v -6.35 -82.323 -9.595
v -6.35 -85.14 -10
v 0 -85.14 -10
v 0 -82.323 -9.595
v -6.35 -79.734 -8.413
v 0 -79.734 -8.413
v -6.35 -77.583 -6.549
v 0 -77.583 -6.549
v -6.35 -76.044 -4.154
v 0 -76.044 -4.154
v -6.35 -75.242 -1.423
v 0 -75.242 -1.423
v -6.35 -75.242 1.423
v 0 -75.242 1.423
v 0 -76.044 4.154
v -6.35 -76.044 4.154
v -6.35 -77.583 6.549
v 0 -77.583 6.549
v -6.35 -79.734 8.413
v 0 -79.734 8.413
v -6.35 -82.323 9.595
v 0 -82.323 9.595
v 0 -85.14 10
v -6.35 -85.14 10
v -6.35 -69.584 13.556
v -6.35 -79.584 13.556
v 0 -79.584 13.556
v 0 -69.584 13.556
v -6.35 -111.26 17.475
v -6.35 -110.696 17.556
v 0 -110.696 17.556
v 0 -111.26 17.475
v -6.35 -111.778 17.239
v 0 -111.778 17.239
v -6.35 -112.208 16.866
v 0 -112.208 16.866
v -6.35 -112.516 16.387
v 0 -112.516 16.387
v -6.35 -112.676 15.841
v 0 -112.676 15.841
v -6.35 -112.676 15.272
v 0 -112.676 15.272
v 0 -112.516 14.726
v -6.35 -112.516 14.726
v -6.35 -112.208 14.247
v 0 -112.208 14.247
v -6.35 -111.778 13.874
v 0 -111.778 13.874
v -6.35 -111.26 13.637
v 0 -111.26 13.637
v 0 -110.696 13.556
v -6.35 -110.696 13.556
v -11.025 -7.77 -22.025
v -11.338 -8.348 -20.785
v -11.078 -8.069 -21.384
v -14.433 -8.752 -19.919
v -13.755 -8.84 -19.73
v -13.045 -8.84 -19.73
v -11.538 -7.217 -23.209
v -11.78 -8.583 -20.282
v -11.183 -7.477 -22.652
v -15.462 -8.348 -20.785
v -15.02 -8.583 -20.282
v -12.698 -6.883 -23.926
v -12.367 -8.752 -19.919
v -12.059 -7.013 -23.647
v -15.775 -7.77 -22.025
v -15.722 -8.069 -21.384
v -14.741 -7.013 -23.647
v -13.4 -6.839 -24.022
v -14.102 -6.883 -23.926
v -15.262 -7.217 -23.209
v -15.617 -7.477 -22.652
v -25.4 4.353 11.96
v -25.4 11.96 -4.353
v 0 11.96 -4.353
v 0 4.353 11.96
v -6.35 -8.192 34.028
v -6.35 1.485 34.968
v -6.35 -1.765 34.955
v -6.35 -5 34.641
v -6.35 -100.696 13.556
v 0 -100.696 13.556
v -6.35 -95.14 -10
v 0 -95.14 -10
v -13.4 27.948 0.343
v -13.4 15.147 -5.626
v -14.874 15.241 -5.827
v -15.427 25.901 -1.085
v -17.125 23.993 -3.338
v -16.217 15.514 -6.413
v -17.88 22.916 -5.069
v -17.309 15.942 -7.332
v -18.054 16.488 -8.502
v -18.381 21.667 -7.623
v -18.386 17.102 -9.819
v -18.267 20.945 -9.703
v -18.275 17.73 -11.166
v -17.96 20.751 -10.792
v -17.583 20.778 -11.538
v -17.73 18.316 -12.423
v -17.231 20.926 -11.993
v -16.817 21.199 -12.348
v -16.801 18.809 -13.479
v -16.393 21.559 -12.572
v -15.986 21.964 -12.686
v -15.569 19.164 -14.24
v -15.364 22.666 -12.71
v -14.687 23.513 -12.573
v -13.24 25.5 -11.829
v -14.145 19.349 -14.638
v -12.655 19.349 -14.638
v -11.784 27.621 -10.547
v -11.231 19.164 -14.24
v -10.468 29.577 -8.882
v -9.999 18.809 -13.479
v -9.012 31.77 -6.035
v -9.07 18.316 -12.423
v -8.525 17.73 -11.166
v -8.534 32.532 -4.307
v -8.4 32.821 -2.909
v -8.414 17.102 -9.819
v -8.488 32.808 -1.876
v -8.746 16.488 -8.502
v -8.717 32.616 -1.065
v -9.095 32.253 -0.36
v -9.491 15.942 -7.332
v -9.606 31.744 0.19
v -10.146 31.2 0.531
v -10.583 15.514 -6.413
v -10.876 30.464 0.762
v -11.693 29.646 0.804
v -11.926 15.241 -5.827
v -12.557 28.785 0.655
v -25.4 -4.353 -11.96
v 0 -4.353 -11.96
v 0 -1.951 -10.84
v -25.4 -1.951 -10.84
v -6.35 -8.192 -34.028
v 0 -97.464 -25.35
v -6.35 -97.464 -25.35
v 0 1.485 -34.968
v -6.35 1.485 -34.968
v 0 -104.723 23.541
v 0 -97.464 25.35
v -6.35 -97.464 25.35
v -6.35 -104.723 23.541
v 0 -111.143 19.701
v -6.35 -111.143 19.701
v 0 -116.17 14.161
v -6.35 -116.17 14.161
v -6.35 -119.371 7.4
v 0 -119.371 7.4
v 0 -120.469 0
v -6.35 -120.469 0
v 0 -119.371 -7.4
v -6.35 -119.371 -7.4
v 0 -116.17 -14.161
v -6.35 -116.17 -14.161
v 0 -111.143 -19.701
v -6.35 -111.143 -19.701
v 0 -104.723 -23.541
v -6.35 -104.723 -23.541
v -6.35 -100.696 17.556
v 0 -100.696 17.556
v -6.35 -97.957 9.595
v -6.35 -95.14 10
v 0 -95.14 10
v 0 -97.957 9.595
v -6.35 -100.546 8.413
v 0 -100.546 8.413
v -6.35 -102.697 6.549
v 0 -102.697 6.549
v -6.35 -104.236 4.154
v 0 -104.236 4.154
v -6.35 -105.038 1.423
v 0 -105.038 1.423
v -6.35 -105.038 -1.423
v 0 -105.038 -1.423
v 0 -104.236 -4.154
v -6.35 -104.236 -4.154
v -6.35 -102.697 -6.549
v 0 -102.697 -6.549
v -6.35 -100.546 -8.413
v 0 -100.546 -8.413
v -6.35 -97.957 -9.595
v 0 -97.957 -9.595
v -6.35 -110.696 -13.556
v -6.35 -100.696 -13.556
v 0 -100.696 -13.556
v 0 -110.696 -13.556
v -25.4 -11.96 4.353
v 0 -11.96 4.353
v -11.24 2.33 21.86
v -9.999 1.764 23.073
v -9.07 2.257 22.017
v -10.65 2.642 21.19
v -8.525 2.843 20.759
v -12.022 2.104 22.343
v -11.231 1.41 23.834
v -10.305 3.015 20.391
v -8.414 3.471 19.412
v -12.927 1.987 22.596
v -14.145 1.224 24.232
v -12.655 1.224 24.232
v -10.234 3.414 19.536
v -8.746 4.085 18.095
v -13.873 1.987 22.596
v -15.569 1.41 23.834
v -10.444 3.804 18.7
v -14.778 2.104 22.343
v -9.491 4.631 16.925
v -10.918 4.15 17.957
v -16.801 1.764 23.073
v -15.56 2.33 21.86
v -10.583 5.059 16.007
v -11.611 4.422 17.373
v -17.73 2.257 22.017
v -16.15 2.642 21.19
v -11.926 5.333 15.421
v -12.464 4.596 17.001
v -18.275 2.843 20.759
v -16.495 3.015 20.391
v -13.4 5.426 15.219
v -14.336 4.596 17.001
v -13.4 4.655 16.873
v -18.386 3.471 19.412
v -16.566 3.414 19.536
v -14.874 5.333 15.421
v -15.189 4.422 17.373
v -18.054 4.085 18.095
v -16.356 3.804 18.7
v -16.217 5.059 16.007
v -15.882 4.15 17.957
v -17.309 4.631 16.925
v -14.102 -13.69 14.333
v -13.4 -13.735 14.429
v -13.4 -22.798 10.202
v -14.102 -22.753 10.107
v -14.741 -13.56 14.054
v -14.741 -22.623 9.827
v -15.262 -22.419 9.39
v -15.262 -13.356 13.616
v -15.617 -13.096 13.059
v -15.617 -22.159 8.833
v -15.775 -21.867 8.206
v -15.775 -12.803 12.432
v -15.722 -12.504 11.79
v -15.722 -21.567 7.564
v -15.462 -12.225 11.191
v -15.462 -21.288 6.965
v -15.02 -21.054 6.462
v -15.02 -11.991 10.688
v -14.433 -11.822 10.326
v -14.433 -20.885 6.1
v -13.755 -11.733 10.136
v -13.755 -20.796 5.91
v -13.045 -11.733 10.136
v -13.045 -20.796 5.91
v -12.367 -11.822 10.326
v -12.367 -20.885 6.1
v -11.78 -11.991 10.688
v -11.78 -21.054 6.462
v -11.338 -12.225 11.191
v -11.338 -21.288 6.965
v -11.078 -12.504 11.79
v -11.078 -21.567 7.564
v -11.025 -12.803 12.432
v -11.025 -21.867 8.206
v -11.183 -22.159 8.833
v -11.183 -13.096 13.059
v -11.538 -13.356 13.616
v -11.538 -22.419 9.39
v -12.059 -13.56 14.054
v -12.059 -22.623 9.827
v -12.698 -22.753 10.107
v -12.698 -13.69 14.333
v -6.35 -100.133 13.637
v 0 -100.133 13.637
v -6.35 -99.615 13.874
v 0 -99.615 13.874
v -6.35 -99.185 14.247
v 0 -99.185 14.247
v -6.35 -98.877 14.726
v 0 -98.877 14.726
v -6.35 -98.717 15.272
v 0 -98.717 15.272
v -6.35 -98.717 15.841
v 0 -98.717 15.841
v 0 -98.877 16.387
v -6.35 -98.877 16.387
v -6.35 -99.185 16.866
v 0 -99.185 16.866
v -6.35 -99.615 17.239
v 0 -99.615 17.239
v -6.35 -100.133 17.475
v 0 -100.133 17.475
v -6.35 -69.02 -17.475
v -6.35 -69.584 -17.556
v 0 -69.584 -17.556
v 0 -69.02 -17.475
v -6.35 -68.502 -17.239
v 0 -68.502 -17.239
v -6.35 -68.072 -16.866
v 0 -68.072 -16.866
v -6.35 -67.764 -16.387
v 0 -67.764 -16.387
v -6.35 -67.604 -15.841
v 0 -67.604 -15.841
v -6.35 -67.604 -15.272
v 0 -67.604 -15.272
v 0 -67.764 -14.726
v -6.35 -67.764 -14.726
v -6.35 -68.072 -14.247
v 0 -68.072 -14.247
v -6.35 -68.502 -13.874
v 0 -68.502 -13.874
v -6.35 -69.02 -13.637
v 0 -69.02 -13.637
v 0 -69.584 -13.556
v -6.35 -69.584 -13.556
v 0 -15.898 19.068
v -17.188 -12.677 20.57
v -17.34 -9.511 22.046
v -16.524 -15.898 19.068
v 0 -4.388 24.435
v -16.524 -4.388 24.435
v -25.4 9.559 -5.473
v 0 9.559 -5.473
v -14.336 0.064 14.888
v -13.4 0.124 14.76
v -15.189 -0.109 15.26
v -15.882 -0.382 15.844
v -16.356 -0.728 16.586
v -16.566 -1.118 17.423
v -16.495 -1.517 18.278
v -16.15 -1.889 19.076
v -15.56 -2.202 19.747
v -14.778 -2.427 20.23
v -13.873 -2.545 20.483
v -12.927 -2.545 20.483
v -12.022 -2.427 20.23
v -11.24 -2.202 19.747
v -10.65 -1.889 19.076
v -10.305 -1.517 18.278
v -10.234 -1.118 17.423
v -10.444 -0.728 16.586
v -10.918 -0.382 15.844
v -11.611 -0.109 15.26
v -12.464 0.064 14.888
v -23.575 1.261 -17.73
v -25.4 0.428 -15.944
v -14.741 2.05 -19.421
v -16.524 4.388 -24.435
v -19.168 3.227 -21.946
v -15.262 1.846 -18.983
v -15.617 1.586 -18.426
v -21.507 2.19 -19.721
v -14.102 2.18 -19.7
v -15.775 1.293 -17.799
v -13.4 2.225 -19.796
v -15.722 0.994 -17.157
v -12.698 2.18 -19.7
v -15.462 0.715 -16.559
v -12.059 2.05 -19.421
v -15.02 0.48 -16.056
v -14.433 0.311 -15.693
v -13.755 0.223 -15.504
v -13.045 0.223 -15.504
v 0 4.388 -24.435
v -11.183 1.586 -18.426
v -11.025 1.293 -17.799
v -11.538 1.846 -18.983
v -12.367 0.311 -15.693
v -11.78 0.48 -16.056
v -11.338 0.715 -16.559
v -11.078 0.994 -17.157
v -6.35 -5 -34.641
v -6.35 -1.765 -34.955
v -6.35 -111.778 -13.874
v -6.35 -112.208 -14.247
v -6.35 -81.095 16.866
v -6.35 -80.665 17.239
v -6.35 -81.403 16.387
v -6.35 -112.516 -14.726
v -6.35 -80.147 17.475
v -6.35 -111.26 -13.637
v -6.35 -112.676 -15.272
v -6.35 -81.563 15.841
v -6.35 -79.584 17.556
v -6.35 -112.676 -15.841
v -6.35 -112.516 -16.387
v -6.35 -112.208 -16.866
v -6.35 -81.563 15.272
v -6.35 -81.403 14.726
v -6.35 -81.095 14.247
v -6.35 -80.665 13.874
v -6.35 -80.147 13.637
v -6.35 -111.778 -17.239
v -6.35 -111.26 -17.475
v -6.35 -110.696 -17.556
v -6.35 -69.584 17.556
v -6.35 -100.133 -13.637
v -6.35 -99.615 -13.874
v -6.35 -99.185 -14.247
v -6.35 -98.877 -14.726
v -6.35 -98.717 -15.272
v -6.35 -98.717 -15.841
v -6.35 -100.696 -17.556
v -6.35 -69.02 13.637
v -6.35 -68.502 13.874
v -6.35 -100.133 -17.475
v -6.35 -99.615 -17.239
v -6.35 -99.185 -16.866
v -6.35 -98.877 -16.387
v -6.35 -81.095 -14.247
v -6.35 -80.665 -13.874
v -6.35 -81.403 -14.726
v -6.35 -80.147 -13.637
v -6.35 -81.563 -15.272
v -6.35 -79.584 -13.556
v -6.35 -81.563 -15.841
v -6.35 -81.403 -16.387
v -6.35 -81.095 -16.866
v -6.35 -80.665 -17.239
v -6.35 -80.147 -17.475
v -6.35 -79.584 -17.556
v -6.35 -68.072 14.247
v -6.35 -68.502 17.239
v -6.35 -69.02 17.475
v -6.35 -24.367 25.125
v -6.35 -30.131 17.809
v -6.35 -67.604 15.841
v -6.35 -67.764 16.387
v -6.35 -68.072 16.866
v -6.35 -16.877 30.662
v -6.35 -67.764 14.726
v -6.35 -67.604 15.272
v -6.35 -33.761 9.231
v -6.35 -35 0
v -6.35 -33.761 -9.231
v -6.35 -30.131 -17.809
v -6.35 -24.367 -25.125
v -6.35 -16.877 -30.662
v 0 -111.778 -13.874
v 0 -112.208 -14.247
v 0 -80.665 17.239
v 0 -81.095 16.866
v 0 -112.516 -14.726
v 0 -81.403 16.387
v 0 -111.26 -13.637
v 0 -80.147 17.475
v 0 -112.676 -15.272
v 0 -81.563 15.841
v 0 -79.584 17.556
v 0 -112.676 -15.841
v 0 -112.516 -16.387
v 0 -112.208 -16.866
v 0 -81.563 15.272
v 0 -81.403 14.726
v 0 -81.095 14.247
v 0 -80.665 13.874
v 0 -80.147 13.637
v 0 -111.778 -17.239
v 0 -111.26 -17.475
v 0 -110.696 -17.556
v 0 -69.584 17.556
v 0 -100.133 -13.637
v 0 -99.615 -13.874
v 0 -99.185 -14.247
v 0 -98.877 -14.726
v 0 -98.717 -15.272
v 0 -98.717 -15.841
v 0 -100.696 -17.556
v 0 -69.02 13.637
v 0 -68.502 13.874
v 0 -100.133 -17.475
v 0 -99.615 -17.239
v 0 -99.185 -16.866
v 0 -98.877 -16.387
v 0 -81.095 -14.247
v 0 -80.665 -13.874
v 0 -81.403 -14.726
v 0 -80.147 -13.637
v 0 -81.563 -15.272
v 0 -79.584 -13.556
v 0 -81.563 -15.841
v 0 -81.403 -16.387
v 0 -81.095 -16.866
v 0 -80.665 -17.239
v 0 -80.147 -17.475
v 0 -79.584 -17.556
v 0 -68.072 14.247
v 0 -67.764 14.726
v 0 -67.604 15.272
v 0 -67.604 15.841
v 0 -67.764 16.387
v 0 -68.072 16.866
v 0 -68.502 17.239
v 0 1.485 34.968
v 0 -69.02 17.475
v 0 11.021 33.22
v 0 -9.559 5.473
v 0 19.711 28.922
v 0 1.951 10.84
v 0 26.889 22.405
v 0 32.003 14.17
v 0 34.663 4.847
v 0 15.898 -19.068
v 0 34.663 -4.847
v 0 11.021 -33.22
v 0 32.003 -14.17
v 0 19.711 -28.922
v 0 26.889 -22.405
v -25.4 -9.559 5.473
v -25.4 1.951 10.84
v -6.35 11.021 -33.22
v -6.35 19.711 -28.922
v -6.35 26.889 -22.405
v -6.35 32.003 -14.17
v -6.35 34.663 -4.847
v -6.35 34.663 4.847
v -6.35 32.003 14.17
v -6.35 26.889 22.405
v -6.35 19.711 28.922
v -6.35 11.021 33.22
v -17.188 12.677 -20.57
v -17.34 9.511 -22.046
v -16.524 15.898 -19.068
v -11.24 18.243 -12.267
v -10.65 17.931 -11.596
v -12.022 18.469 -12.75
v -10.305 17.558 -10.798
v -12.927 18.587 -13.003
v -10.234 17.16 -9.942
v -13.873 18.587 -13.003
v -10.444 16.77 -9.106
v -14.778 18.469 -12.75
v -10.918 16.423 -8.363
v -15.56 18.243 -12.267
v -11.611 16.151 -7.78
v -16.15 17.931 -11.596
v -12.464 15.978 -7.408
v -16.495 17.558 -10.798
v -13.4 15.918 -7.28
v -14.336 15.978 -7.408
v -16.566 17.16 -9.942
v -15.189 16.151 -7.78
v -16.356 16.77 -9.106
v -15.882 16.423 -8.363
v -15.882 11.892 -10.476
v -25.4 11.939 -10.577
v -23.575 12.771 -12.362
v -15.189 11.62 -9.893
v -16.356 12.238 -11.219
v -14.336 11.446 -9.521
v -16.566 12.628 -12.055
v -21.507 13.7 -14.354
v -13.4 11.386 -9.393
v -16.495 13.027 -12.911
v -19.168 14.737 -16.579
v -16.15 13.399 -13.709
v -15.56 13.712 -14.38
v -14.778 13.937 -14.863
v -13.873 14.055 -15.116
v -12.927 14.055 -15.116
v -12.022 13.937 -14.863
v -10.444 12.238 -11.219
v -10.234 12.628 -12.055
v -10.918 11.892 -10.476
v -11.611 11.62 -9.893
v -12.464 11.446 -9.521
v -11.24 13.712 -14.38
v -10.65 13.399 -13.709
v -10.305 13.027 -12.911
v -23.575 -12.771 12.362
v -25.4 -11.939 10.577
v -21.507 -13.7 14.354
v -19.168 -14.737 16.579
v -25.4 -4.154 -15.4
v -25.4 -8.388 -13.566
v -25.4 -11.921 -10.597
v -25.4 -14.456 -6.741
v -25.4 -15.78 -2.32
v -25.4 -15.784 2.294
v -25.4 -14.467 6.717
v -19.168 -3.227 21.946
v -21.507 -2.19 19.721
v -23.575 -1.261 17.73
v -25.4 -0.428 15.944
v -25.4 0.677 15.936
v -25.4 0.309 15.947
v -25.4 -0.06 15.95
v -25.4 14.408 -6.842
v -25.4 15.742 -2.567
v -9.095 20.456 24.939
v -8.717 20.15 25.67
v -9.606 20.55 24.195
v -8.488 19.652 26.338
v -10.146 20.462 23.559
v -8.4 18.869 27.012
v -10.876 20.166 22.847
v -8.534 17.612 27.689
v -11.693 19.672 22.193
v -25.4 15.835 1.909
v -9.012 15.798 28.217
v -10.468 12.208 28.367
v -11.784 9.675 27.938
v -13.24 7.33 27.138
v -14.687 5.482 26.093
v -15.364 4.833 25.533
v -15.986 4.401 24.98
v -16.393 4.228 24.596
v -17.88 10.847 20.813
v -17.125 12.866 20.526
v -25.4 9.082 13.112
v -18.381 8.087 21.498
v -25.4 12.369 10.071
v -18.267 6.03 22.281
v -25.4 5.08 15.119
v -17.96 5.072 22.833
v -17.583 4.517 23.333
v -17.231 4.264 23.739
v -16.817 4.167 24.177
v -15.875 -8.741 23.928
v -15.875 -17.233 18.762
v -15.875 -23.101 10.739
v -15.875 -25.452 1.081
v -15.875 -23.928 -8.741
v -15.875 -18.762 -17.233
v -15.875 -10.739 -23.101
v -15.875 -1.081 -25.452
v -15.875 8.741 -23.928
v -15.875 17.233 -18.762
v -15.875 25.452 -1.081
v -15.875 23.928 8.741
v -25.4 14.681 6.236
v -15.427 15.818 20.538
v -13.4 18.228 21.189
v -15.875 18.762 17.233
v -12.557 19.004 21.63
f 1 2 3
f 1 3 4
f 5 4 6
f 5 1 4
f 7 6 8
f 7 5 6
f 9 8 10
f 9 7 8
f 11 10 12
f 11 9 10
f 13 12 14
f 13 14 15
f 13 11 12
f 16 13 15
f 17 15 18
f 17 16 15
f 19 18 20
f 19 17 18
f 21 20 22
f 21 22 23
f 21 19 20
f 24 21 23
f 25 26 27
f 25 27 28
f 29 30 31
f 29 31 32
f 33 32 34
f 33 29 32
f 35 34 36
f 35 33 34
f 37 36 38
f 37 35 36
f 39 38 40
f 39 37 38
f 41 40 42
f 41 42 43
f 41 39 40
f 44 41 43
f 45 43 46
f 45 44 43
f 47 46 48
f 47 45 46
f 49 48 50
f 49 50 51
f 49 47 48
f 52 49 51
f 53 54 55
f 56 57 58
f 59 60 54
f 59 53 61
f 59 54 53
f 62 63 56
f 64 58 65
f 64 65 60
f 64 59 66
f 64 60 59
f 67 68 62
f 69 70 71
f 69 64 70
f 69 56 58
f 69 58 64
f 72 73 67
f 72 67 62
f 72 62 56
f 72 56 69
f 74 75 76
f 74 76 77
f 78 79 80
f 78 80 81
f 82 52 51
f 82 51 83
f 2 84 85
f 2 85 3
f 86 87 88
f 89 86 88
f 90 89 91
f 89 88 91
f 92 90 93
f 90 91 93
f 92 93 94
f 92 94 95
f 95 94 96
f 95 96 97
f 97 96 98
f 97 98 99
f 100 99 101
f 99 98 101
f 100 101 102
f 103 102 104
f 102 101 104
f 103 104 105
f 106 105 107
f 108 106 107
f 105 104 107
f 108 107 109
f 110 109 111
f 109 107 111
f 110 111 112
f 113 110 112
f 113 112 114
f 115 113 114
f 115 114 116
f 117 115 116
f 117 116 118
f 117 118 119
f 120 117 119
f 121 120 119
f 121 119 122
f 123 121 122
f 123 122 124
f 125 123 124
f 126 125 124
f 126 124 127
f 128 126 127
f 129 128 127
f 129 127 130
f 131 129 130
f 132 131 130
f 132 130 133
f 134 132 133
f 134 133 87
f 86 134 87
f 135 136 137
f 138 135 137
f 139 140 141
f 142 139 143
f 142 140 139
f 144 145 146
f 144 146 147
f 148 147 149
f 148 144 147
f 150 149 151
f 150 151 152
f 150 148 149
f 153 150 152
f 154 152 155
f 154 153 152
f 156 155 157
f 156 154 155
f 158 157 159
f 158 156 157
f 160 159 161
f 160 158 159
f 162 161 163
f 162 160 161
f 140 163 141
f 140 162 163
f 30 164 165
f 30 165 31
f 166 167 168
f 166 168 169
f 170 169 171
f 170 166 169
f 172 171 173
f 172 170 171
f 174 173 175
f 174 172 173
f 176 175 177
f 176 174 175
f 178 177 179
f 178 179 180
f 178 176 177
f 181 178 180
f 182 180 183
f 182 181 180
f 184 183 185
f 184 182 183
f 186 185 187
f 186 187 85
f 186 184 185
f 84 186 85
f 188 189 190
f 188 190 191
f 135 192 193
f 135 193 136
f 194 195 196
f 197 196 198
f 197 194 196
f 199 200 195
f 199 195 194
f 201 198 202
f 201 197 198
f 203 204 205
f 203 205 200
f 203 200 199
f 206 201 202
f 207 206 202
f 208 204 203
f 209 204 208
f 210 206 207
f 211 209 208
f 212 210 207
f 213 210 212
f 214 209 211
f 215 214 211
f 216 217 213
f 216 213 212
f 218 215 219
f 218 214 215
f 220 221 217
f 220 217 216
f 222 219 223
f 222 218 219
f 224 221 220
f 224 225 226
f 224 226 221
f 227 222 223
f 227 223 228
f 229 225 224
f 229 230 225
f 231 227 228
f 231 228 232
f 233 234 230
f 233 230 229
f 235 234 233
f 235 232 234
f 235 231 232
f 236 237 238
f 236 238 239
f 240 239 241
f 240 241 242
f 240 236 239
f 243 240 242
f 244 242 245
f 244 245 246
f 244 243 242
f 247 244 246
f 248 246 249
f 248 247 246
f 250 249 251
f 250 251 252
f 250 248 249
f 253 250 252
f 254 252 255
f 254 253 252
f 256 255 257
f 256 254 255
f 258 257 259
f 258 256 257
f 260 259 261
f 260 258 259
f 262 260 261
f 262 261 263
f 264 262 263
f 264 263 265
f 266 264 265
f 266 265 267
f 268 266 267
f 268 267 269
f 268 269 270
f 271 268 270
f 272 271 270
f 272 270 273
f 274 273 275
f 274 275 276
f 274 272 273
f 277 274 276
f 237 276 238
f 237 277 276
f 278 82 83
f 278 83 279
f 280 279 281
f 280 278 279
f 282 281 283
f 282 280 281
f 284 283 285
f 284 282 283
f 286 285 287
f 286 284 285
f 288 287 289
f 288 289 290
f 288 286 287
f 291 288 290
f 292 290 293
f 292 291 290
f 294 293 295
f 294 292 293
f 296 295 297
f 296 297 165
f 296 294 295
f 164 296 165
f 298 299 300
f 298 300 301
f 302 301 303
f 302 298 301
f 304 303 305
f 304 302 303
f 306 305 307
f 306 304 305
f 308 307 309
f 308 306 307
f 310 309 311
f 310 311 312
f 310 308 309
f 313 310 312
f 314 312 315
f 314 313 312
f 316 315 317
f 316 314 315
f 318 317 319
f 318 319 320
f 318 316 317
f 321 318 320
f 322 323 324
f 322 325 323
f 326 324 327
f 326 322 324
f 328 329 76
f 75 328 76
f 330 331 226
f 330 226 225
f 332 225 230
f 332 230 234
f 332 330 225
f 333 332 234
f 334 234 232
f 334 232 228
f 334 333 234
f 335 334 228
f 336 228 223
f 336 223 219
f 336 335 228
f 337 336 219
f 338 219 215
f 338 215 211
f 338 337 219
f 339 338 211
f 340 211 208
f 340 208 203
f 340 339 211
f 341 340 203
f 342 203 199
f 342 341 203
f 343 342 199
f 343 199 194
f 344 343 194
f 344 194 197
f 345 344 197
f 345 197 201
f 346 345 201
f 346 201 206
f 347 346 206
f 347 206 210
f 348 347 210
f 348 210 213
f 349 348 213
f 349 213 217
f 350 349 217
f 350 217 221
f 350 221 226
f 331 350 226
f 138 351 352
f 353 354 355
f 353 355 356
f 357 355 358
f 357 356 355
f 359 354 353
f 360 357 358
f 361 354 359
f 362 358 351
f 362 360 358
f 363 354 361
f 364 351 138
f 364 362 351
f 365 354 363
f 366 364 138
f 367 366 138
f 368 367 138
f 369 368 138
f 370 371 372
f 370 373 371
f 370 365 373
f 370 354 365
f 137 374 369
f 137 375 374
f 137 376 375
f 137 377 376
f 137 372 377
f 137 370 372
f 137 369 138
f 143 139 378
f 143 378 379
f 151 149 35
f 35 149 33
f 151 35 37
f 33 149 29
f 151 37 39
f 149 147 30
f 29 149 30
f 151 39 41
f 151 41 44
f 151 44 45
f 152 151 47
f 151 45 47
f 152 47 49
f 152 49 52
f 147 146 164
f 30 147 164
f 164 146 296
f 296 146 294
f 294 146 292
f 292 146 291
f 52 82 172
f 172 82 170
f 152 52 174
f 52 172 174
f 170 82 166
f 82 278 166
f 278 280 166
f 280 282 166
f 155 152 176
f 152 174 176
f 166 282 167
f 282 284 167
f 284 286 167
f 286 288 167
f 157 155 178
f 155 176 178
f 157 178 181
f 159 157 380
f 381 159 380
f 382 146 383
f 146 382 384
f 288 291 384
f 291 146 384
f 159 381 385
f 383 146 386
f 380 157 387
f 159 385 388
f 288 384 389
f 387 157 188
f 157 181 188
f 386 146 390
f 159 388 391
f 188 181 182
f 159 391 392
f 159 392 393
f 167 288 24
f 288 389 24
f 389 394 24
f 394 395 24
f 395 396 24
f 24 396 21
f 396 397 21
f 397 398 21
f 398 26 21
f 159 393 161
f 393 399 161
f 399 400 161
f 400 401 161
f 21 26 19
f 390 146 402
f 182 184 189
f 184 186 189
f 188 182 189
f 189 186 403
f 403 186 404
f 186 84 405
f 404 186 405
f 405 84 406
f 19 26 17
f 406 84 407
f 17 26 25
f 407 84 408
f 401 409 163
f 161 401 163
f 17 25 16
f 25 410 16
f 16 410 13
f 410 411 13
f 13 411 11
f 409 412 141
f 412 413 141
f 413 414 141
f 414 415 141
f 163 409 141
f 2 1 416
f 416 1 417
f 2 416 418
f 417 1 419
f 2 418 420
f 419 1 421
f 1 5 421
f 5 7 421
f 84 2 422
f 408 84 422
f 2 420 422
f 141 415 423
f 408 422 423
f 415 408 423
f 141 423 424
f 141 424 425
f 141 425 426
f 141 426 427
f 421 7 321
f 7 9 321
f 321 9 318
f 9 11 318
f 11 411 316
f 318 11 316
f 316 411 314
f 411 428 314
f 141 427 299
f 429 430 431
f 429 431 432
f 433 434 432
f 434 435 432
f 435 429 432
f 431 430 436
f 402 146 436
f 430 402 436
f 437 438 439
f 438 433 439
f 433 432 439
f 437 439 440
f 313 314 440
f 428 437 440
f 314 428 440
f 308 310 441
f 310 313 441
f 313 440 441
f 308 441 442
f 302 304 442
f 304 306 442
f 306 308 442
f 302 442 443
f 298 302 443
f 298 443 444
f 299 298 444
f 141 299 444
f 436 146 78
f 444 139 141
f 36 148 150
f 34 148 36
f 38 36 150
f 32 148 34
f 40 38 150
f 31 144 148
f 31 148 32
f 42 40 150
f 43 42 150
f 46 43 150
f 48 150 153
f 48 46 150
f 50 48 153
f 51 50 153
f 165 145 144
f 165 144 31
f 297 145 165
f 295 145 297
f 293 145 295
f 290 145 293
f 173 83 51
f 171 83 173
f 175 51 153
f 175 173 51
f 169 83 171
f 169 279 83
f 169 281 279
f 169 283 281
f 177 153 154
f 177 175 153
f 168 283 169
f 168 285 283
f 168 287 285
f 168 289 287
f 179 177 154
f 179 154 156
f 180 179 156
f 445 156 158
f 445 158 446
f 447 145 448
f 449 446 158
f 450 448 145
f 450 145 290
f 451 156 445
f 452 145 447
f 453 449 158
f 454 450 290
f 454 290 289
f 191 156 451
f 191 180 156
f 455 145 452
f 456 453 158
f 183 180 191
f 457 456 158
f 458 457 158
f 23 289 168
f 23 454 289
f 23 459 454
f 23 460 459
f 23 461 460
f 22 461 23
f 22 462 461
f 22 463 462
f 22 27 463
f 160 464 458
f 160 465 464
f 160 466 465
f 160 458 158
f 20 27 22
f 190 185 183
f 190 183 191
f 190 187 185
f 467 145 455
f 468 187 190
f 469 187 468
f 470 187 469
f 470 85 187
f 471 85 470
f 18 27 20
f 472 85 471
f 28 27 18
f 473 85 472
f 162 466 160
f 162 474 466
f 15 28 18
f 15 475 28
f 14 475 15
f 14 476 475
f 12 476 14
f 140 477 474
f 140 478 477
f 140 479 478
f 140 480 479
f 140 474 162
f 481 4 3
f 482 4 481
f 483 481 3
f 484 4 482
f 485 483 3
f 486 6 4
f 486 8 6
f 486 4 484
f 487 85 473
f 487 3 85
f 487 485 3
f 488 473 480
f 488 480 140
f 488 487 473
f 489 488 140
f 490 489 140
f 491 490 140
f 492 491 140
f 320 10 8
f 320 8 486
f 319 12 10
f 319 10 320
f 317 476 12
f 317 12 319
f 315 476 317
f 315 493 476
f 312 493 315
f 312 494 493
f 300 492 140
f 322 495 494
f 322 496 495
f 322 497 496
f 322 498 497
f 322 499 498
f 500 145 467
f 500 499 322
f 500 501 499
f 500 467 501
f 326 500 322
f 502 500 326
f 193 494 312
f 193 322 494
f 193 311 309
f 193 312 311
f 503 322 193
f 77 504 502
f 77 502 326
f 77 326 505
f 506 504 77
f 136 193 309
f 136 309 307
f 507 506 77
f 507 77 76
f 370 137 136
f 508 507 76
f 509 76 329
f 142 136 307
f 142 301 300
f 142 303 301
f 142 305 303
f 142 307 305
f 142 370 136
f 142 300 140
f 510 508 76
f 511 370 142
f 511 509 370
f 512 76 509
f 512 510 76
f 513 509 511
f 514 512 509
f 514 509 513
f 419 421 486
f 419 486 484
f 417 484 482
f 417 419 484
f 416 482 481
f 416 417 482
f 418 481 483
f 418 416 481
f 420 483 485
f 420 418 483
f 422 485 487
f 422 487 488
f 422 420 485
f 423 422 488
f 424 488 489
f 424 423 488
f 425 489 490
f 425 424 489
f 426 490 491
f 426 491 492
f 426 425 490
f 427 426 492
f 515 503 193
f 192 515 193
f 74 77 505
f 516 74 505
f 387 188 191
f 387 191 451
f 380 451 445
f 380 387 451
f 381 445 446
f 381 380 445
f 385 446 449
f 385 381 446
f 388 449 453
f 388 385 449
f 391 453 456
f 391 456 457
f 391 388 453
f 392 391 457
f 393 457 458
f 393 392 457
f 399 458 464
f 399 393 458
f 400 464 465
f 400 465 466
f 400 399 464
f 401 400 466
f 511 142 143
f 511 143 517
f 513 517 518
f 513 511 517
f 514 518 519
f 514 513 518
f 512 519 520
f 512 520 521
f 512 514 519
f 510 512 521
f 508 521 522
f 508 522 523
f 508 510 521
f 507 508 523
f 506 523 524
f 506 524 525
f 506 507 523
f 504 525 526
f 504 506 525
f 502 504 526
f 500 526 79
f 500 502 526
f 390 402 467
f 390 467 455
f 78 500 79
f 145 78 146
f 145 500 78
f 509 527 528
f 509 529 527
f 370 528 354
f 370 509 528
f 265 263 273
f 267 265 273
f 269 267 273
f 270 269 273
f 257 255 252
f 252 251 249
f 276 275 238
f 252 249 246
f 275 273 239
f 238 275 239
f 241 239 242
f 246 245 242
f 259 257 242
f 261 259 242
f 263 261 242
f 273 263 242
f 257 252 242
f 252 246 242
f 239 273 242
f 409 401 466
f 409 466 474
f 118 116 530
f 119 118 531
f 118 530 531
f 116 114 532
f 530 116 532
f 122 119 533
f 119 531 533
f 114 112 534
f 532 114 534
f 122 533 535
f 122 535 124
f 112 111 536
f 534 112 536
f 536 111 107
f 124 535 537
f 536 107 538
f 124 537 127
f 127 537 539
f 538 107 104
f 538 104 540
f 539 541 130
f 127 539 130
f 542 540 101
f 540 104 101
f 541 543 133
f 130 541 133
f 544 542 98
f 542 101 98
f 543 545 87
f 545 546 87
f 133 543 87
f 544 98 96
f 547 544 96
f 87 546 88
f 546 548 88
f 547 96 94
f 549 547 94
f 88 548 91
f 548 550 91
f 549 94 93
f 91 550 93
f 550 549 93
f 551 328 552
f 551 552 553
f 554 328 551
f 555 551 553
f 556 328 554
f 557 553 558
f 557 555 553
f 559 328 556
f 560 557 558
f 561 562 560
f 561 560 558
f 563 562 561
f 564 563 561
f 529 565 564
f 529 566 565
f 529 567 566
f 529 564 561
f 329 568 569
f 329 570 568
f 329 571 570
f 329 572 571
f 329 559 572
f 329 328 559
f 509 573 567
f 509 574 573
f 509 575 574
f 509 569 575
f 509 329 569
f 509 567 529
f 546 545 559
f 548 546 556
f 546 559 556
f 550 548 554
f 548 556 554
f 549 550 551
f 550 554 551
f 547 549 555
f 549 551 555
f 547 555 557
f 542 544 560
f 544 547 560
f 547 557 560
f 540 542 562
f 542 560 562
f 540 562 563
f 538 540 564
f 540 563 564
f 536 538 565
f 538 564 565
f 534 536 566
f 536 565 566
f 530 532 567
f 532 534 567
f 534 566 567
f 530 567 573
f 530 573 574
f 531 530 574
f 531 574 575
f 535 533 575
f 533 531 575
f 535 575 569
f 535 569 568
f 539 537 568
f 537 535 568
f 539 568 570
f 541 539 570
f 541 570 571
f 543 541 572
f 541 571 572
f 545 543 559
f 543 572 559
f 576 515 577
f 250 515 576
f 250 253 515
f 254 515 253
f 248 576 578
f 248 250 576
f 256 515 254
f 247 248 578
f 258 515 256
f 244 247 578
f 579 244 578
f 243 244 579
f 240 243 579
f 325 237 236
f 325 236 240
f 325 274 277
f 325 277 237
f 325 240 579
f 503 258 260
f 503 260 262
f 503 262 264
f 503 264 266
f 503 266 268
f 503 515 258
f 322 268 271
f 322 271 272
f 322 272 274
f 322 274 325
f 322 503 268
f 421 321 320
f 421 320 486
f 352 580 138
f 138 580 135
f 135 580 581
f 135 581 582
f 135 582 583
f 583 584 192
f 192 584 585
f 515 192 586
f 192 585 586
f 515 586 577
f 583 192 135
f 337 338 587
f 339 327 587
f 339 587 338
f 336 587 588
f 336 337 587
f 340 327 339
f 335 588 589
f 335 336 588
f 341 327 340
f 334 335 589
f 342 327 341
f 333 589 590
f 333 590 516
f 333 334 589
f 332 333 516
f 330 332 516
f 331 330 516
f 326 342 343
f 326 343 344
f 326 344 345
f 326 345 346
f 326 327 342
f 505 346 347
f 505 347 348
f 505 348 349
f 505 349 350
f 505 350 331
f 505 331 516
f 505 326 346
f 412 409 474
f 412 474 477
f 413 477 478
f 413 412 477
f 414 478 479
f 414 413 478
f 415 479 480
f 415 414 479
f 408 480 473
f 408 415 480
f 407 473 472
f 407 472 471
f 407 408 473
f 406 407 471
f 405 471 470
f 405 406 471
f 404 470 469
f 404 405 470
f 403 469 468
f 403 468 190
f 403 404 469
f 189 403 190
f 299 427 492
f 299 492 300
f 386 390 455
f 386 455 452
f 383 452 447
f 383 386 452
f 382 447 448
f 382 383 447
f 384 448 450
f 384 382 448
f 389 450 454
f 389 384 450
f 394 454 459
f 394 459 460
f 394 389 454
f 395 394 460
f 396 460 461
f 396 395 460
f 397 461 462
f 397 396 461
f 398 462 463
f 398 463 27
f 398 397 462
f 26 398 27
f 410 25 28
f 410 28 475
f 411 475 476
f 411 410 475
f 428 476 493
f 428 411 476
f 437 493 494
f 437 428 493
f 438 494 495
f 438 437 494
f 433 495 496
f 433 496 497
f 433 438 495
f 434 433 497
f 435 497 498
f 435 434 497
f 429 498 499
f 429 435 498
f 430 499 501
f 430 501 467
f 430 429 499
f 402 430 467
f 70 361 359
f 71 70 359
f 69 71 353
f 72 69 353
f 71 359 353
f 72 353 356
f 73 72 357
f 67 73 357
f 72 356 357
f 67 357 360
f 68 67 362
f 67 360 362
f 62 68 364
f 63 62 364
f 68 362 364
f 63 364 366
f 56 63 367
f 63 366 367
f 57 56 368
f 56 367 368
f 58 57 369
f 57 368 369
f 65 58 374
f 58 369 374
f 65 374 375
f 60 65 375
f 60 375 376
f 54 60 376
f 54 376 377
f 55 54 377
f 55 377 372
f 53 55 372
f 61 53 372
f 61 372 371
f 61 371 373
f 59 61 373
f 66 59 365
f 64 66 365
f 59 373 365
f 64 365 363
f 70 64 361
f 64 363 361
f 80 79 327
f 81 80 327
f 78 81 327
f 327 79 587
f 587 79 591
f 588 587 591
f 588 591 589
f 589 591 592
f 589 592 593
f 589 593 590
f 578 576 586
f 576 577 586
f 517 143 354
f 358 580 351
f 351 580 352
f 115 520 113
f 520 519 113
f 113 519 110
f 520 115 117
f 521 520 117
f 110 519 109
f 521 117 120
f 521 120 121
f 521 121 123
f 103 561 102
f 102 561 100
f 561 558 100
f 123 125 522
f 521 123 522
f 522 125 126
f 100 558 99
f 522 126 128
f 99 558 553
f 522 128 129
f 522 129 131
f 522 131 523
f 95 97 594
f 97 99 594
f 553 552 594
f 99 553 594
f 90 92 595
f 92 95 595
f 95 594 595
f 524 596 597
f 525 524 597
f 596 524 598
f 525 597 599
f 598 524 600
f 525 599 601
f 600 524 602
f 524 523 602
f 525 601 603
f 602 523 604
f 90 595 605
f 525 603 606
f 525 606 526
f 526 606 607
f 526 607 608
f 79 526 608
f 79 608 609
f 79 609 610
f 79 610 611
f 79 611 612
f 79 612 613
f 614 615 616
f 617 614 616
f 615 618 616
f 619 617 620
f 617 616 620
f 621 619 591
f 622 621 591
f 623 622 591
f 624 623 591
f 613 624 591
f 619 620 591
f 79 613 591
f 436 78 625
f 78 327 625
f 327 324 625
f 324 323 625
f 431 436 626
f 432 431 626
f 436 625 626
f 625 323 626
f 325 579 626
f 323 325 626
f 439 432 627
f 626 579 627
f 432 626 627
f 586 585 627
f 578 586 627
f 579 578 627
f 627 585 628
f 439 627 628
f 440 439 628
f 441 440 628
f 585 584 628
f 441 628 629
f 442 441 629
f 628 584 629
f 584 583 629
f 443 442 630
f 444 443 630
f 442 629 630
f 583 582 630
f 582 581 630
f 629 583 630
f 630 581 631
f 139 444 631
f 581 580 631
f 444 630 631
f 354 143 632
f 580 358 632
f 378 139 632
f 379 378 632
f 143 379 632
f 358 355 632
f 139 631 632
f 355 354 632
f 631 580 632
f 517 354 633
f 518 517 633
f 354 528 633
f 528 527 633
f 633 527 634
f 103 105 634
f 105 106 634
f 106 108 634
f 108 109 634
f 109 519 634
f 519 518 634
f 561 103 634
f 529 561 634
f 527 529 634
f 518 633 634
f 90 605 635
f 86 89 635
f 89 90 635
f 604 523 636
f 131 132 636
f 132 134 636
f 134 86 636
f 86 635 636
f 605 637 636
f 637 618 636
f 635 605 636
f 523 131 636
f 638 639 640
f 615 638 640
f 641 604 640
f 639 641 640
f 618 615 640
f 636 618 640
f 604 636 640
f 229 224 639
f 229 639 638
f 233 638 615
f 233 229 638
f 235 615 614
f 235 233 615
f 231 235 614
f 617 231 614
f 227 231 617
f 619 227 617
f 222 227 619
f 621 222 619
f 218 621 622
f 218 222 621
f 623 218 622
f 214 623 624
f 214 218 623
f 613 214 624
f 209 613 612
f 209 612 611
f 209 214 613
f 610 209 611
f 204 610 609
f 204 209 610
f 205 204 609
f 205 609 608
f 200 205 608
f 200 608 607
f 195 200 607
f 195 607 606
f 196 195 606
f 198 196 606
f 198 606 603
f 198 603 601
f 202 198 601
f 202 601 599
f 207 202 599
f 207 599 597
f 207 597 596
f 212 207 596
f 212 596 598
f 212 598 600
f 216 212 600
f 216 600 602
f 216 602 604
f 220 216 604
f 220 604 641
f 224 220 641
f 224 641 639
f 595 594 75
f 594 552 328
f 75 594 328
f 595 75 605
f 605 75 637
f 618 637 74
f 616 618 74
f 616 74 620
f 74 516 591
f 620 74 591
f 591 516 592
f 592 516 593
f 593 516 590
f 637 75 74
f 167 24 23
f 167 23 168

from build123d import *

# Parameters (mm, degrees)
BOSS_EXTRUDE1_DEPTH = 6.35
SKETCH20_R          = 35
BOSS_EXTRUDE5_DEPTH = 19.05
CUT_EXTRUDE14_DEPTH = 128.996314535
CHAMFER1_SIZE       = 19.05
SKETCH22_R          = 3.175
CUT_EXTRUDE15_DEPTH = 135.156064825
SKETCH24_R          = 5
CUT_EXTRUDE16_DEPTH = 140.018309755
SKETCH25_R          = 2.38125
CUT_EXTRUDE17_DEPTH = 10
CUT_EXTRUDE18_DEPTH = 10


with BuildPart() as part:
    # Sketch1 → Boss-Extrude1 (new body)
    with BuildSketch(Plane(origin=(0, 0, 0), x_dir=(0, 0, -1), z_dir=(1, 0, 0))):
        with BuildLine():
            Line((-34.968464441, 1.48542743), (-25.35, -97.464164516))
            ThreePointArc((-25.35, -97.464164516), (0, -120.469483831), (25.35, -97.464164516))
            Line((25.35, -97.464164516), (34.968464441, 1.48542743))
            ThreePointArc((34.968464441, 1.48542743), (0, 35), (-34.968464441, 1.48542743))
        make_face()
        Polygon((4.353205728, 11.960334439), (-11.960334439, 4.353205728), (-4.353205728, -11.960334439), (11.960334439, -4.353205728), align=None, mode=Mode.SUBTRACT)
    extrude(amount=BOSS_EXTRUDE1_DEPTH)

    # Sketch20 → Boss-Extrude5 (add)
    with BuildSketch(Plane(origin=(6.35, 0, 0), x_dir=(0, 0, -1), z_dir=(1, 0, 0))):
        with Locations(Location((0, 0, 0), (0, 0, 177.567591624))):
            Circle(SKETCH20_R)
    extrude(amount=BOSS_EXTRUDE5_DEPTH)

    # Sketch21 → Cut-Extrude14 (cut, through all)
    with BuildSketch(Plane.ZY):
        Polygon((-19.067760927, 15.897892729), (-24.435012851, 4.387783834), (-10.840396045, -1.951490092), (-5.473144121, 9.558618803), align=None)
        Polygon((-11.960334439, -4.353205728), (-4.353205728, 11.960334439), (11.960334439, 4.353205728), (4.353205728, -11.960334439), align=None)
        Polygon((10.840396045, 1.951490092), (5.473144121, -9.558618803), (19.067760927, -15.897892729), (24.435012851, -4.387783834), align=None)
    extrude(amount=-CUT_EXTRUDE14_DEPTH, mode=Mode.SUBTRACT)

    # Chamfer1
    # the kernel refuses this chamfer: 19.05 mm, written as the material it takes off along each edge
    with BuildSketch(Plane(origin=(25.4, 0, 0), x_dir=(0, 0.042440783710504346, 0.9990989840241247), z_dir=(0, 0.9990989840241247, -0.042440783710504346))) as chamfer1_piece_1:
        Polygon((35, -CHAMFER1_SIZE), (35 - CHAMFER1_SIZE, 0), (35, 0), align=None)
    revolve(axis=Axis((25.4, 0, 0), (1, 0, 0)), mode=Mode.SUBTRACT)

    # Sketch22 → Cut-Extrude15 (cut, through all)
    with BuildSketch(Plane(origin=(0, 5.755054448, 2.683625962), x_dir=(-1, 0, 0), z_dir=(0, -0.9063077870366495, -0.4226182617407006))):
        with Locations(Location((-13.4, -16.5, 0), (0, 0, 90))):
            Circle(SKETCH22_R)
    cut_extrude15 = extrude(amount=-CUT_EXTRUDE15_DEPTH, mode=Mode.SUBTRACT)

    # Sketch24 → Cut-Extrude16 (cut, through all)
    with BuildSketch(Plane(origin=(0, 10.286593383, 4.796717271), x_dir=(-1, 0, 0), z_dir=(0, -0.9063077870366495, -0.4226182617407006))):
        with Locations(Location((-13.4, -16.5, 0), (0, 0, 90))):
            Circle(SKETCH24_R)
    cut_extrude16 = extrude(amount=-CUT_EXTRUDE16_DEPTH, mode=Mode.SUBTRACT)

    # Sketch25 → Cut-Extrude17 (cut)
    with BuildSketch(Plane(origin=(0, -5.755054448, -2.683625962), x_dir=(1, 0, 0), z_dir=(0, 0.9063077870366495, 0.4226182617407006))):
        with Locations(Location((13.4, -16.5, 0), (0, 0, 270))):
            Circle(SKETCH25_R)
    cut_extrude17 = extrude(amount=-CUT_EXTRUDE17_DEPTH, mode=Mode.SUBTRACT)

    # Mirror1: Cut-Extrude15, Cut-Extrude16, Cut-Extrude17 across plane
    add(cut_extrude15.mirror(Plane(origin=(0, 0, 0), x_dir=(1, 0, 0), z_dir=(0, 0.42261826174070105, -0.9063077870366493))), mode=Mode.SUBTRACT)
    add(cut_extrude16.mirror(Plane(origin=(0, 0, 0), x_dir=(1, 0, 0), z_dir=(0, 0.42261826174070105, -0.9063077870366493))), mode=Mode.SUBTRACT)
    add(cut_extrude17.mirror(Plane(origin=(0, 0, 0), x_dir=(1, 0, 0), z_dir=(0, 0.42261826174070105, -0.9063077870366493))), mode=Mode.SUBTRACT)

    # Sketch19 → Cut-Extrude18 (cut)
    with BuildSketch(Plane(origin=(6.35, 0, 0), x_dir=(0, 0, -1), z_dir=(1, 0, 0))):
        with BuildLine():
            Line((13.556349186, -69.583650814), (13.556349186, -79.583650814))
            ThreePointArc((13.556349186, -79.583650814), (15.556349186, -81.583650814), (17.556349186, -79.583650814))
            Line((17.556349186, -79.583650814), (17.556349186, -69.583650814))
            ThreePointArc((17.556349186, -69.583650814), (15.556349186, -67.583650814), (13.556349186, -69.583650814))
        make_face()
        with BuildLine():
            Line((-10, -85.14), (-10, -95.14))
            ThreePointArc((-10, -95.14), (0, -105.14), (10, -95.14))
            Line((10, -95.14), (10, -85.14))
            ThreePointArc((10, -85.14), (0, -75.14), (-10, -85.14))
        make_face()
        with BuildLine():
            Line((17.556349186, -110.696349186), (17.556349186, -100.696349186))
            ThreePointArc((17.556349186, -100.696349186), (15.556349186, -98.696349186), (13.556349186, -100.696349186))
            Line((13.556349186, -100.696349186), (13.556349186, -110.696349186))
            ThreePointArc((13.556349186, -110.696349186), (15.556349186, -112.696349186), (17.556349186, -110.696349186))
        make_face()
        with BuildLine():
            Line((-17.556349186, -69.583650814), (-17.556349186, -79.583650814))
            ThreePointArc((-17.556349186, -79.583650814), (-15.556349186, -81.583650814), (-13.556349186, -79.583650814))
            Line((-13.556349186, -79.583650814), (-13.556349186, -69.583650814))
            ThreePointArc((-13.556349186, -69.583650814), (-15.556349186, -67.583650814), (-17.556349186, -69.583650814))
        make_face()
        with BuildLine():
            Line((-13.556349186, -110.696349186), (-13.556349186, -100.696349186))
            ThreePointArc((-13.556349186, -100.696349186), (-15.556349186, -98.696349186), (-17.556349186, -100.696349186))
            Line((-17.556349186, -100.696349186), (-17.556349186, -110.696349186))
            ThreePointArc((-17.556349186, -110.696349186), (-15.556349186, -112.696349186), (-13.556349186, -110.696349186))
        make_face()
    extrude(amount=-CUT_EXTRUDE18_DEPTH, mode=Mode.SUBTRACT)


with BuildPart() as body_2:
    # Mirror2: mirrored copy
    add(part.part.mirror(Plane(origin=(0, 0, 0), x_dir=(0, 0, 1), z_dir=(1, 0, 0))))


solid = body_2.part
